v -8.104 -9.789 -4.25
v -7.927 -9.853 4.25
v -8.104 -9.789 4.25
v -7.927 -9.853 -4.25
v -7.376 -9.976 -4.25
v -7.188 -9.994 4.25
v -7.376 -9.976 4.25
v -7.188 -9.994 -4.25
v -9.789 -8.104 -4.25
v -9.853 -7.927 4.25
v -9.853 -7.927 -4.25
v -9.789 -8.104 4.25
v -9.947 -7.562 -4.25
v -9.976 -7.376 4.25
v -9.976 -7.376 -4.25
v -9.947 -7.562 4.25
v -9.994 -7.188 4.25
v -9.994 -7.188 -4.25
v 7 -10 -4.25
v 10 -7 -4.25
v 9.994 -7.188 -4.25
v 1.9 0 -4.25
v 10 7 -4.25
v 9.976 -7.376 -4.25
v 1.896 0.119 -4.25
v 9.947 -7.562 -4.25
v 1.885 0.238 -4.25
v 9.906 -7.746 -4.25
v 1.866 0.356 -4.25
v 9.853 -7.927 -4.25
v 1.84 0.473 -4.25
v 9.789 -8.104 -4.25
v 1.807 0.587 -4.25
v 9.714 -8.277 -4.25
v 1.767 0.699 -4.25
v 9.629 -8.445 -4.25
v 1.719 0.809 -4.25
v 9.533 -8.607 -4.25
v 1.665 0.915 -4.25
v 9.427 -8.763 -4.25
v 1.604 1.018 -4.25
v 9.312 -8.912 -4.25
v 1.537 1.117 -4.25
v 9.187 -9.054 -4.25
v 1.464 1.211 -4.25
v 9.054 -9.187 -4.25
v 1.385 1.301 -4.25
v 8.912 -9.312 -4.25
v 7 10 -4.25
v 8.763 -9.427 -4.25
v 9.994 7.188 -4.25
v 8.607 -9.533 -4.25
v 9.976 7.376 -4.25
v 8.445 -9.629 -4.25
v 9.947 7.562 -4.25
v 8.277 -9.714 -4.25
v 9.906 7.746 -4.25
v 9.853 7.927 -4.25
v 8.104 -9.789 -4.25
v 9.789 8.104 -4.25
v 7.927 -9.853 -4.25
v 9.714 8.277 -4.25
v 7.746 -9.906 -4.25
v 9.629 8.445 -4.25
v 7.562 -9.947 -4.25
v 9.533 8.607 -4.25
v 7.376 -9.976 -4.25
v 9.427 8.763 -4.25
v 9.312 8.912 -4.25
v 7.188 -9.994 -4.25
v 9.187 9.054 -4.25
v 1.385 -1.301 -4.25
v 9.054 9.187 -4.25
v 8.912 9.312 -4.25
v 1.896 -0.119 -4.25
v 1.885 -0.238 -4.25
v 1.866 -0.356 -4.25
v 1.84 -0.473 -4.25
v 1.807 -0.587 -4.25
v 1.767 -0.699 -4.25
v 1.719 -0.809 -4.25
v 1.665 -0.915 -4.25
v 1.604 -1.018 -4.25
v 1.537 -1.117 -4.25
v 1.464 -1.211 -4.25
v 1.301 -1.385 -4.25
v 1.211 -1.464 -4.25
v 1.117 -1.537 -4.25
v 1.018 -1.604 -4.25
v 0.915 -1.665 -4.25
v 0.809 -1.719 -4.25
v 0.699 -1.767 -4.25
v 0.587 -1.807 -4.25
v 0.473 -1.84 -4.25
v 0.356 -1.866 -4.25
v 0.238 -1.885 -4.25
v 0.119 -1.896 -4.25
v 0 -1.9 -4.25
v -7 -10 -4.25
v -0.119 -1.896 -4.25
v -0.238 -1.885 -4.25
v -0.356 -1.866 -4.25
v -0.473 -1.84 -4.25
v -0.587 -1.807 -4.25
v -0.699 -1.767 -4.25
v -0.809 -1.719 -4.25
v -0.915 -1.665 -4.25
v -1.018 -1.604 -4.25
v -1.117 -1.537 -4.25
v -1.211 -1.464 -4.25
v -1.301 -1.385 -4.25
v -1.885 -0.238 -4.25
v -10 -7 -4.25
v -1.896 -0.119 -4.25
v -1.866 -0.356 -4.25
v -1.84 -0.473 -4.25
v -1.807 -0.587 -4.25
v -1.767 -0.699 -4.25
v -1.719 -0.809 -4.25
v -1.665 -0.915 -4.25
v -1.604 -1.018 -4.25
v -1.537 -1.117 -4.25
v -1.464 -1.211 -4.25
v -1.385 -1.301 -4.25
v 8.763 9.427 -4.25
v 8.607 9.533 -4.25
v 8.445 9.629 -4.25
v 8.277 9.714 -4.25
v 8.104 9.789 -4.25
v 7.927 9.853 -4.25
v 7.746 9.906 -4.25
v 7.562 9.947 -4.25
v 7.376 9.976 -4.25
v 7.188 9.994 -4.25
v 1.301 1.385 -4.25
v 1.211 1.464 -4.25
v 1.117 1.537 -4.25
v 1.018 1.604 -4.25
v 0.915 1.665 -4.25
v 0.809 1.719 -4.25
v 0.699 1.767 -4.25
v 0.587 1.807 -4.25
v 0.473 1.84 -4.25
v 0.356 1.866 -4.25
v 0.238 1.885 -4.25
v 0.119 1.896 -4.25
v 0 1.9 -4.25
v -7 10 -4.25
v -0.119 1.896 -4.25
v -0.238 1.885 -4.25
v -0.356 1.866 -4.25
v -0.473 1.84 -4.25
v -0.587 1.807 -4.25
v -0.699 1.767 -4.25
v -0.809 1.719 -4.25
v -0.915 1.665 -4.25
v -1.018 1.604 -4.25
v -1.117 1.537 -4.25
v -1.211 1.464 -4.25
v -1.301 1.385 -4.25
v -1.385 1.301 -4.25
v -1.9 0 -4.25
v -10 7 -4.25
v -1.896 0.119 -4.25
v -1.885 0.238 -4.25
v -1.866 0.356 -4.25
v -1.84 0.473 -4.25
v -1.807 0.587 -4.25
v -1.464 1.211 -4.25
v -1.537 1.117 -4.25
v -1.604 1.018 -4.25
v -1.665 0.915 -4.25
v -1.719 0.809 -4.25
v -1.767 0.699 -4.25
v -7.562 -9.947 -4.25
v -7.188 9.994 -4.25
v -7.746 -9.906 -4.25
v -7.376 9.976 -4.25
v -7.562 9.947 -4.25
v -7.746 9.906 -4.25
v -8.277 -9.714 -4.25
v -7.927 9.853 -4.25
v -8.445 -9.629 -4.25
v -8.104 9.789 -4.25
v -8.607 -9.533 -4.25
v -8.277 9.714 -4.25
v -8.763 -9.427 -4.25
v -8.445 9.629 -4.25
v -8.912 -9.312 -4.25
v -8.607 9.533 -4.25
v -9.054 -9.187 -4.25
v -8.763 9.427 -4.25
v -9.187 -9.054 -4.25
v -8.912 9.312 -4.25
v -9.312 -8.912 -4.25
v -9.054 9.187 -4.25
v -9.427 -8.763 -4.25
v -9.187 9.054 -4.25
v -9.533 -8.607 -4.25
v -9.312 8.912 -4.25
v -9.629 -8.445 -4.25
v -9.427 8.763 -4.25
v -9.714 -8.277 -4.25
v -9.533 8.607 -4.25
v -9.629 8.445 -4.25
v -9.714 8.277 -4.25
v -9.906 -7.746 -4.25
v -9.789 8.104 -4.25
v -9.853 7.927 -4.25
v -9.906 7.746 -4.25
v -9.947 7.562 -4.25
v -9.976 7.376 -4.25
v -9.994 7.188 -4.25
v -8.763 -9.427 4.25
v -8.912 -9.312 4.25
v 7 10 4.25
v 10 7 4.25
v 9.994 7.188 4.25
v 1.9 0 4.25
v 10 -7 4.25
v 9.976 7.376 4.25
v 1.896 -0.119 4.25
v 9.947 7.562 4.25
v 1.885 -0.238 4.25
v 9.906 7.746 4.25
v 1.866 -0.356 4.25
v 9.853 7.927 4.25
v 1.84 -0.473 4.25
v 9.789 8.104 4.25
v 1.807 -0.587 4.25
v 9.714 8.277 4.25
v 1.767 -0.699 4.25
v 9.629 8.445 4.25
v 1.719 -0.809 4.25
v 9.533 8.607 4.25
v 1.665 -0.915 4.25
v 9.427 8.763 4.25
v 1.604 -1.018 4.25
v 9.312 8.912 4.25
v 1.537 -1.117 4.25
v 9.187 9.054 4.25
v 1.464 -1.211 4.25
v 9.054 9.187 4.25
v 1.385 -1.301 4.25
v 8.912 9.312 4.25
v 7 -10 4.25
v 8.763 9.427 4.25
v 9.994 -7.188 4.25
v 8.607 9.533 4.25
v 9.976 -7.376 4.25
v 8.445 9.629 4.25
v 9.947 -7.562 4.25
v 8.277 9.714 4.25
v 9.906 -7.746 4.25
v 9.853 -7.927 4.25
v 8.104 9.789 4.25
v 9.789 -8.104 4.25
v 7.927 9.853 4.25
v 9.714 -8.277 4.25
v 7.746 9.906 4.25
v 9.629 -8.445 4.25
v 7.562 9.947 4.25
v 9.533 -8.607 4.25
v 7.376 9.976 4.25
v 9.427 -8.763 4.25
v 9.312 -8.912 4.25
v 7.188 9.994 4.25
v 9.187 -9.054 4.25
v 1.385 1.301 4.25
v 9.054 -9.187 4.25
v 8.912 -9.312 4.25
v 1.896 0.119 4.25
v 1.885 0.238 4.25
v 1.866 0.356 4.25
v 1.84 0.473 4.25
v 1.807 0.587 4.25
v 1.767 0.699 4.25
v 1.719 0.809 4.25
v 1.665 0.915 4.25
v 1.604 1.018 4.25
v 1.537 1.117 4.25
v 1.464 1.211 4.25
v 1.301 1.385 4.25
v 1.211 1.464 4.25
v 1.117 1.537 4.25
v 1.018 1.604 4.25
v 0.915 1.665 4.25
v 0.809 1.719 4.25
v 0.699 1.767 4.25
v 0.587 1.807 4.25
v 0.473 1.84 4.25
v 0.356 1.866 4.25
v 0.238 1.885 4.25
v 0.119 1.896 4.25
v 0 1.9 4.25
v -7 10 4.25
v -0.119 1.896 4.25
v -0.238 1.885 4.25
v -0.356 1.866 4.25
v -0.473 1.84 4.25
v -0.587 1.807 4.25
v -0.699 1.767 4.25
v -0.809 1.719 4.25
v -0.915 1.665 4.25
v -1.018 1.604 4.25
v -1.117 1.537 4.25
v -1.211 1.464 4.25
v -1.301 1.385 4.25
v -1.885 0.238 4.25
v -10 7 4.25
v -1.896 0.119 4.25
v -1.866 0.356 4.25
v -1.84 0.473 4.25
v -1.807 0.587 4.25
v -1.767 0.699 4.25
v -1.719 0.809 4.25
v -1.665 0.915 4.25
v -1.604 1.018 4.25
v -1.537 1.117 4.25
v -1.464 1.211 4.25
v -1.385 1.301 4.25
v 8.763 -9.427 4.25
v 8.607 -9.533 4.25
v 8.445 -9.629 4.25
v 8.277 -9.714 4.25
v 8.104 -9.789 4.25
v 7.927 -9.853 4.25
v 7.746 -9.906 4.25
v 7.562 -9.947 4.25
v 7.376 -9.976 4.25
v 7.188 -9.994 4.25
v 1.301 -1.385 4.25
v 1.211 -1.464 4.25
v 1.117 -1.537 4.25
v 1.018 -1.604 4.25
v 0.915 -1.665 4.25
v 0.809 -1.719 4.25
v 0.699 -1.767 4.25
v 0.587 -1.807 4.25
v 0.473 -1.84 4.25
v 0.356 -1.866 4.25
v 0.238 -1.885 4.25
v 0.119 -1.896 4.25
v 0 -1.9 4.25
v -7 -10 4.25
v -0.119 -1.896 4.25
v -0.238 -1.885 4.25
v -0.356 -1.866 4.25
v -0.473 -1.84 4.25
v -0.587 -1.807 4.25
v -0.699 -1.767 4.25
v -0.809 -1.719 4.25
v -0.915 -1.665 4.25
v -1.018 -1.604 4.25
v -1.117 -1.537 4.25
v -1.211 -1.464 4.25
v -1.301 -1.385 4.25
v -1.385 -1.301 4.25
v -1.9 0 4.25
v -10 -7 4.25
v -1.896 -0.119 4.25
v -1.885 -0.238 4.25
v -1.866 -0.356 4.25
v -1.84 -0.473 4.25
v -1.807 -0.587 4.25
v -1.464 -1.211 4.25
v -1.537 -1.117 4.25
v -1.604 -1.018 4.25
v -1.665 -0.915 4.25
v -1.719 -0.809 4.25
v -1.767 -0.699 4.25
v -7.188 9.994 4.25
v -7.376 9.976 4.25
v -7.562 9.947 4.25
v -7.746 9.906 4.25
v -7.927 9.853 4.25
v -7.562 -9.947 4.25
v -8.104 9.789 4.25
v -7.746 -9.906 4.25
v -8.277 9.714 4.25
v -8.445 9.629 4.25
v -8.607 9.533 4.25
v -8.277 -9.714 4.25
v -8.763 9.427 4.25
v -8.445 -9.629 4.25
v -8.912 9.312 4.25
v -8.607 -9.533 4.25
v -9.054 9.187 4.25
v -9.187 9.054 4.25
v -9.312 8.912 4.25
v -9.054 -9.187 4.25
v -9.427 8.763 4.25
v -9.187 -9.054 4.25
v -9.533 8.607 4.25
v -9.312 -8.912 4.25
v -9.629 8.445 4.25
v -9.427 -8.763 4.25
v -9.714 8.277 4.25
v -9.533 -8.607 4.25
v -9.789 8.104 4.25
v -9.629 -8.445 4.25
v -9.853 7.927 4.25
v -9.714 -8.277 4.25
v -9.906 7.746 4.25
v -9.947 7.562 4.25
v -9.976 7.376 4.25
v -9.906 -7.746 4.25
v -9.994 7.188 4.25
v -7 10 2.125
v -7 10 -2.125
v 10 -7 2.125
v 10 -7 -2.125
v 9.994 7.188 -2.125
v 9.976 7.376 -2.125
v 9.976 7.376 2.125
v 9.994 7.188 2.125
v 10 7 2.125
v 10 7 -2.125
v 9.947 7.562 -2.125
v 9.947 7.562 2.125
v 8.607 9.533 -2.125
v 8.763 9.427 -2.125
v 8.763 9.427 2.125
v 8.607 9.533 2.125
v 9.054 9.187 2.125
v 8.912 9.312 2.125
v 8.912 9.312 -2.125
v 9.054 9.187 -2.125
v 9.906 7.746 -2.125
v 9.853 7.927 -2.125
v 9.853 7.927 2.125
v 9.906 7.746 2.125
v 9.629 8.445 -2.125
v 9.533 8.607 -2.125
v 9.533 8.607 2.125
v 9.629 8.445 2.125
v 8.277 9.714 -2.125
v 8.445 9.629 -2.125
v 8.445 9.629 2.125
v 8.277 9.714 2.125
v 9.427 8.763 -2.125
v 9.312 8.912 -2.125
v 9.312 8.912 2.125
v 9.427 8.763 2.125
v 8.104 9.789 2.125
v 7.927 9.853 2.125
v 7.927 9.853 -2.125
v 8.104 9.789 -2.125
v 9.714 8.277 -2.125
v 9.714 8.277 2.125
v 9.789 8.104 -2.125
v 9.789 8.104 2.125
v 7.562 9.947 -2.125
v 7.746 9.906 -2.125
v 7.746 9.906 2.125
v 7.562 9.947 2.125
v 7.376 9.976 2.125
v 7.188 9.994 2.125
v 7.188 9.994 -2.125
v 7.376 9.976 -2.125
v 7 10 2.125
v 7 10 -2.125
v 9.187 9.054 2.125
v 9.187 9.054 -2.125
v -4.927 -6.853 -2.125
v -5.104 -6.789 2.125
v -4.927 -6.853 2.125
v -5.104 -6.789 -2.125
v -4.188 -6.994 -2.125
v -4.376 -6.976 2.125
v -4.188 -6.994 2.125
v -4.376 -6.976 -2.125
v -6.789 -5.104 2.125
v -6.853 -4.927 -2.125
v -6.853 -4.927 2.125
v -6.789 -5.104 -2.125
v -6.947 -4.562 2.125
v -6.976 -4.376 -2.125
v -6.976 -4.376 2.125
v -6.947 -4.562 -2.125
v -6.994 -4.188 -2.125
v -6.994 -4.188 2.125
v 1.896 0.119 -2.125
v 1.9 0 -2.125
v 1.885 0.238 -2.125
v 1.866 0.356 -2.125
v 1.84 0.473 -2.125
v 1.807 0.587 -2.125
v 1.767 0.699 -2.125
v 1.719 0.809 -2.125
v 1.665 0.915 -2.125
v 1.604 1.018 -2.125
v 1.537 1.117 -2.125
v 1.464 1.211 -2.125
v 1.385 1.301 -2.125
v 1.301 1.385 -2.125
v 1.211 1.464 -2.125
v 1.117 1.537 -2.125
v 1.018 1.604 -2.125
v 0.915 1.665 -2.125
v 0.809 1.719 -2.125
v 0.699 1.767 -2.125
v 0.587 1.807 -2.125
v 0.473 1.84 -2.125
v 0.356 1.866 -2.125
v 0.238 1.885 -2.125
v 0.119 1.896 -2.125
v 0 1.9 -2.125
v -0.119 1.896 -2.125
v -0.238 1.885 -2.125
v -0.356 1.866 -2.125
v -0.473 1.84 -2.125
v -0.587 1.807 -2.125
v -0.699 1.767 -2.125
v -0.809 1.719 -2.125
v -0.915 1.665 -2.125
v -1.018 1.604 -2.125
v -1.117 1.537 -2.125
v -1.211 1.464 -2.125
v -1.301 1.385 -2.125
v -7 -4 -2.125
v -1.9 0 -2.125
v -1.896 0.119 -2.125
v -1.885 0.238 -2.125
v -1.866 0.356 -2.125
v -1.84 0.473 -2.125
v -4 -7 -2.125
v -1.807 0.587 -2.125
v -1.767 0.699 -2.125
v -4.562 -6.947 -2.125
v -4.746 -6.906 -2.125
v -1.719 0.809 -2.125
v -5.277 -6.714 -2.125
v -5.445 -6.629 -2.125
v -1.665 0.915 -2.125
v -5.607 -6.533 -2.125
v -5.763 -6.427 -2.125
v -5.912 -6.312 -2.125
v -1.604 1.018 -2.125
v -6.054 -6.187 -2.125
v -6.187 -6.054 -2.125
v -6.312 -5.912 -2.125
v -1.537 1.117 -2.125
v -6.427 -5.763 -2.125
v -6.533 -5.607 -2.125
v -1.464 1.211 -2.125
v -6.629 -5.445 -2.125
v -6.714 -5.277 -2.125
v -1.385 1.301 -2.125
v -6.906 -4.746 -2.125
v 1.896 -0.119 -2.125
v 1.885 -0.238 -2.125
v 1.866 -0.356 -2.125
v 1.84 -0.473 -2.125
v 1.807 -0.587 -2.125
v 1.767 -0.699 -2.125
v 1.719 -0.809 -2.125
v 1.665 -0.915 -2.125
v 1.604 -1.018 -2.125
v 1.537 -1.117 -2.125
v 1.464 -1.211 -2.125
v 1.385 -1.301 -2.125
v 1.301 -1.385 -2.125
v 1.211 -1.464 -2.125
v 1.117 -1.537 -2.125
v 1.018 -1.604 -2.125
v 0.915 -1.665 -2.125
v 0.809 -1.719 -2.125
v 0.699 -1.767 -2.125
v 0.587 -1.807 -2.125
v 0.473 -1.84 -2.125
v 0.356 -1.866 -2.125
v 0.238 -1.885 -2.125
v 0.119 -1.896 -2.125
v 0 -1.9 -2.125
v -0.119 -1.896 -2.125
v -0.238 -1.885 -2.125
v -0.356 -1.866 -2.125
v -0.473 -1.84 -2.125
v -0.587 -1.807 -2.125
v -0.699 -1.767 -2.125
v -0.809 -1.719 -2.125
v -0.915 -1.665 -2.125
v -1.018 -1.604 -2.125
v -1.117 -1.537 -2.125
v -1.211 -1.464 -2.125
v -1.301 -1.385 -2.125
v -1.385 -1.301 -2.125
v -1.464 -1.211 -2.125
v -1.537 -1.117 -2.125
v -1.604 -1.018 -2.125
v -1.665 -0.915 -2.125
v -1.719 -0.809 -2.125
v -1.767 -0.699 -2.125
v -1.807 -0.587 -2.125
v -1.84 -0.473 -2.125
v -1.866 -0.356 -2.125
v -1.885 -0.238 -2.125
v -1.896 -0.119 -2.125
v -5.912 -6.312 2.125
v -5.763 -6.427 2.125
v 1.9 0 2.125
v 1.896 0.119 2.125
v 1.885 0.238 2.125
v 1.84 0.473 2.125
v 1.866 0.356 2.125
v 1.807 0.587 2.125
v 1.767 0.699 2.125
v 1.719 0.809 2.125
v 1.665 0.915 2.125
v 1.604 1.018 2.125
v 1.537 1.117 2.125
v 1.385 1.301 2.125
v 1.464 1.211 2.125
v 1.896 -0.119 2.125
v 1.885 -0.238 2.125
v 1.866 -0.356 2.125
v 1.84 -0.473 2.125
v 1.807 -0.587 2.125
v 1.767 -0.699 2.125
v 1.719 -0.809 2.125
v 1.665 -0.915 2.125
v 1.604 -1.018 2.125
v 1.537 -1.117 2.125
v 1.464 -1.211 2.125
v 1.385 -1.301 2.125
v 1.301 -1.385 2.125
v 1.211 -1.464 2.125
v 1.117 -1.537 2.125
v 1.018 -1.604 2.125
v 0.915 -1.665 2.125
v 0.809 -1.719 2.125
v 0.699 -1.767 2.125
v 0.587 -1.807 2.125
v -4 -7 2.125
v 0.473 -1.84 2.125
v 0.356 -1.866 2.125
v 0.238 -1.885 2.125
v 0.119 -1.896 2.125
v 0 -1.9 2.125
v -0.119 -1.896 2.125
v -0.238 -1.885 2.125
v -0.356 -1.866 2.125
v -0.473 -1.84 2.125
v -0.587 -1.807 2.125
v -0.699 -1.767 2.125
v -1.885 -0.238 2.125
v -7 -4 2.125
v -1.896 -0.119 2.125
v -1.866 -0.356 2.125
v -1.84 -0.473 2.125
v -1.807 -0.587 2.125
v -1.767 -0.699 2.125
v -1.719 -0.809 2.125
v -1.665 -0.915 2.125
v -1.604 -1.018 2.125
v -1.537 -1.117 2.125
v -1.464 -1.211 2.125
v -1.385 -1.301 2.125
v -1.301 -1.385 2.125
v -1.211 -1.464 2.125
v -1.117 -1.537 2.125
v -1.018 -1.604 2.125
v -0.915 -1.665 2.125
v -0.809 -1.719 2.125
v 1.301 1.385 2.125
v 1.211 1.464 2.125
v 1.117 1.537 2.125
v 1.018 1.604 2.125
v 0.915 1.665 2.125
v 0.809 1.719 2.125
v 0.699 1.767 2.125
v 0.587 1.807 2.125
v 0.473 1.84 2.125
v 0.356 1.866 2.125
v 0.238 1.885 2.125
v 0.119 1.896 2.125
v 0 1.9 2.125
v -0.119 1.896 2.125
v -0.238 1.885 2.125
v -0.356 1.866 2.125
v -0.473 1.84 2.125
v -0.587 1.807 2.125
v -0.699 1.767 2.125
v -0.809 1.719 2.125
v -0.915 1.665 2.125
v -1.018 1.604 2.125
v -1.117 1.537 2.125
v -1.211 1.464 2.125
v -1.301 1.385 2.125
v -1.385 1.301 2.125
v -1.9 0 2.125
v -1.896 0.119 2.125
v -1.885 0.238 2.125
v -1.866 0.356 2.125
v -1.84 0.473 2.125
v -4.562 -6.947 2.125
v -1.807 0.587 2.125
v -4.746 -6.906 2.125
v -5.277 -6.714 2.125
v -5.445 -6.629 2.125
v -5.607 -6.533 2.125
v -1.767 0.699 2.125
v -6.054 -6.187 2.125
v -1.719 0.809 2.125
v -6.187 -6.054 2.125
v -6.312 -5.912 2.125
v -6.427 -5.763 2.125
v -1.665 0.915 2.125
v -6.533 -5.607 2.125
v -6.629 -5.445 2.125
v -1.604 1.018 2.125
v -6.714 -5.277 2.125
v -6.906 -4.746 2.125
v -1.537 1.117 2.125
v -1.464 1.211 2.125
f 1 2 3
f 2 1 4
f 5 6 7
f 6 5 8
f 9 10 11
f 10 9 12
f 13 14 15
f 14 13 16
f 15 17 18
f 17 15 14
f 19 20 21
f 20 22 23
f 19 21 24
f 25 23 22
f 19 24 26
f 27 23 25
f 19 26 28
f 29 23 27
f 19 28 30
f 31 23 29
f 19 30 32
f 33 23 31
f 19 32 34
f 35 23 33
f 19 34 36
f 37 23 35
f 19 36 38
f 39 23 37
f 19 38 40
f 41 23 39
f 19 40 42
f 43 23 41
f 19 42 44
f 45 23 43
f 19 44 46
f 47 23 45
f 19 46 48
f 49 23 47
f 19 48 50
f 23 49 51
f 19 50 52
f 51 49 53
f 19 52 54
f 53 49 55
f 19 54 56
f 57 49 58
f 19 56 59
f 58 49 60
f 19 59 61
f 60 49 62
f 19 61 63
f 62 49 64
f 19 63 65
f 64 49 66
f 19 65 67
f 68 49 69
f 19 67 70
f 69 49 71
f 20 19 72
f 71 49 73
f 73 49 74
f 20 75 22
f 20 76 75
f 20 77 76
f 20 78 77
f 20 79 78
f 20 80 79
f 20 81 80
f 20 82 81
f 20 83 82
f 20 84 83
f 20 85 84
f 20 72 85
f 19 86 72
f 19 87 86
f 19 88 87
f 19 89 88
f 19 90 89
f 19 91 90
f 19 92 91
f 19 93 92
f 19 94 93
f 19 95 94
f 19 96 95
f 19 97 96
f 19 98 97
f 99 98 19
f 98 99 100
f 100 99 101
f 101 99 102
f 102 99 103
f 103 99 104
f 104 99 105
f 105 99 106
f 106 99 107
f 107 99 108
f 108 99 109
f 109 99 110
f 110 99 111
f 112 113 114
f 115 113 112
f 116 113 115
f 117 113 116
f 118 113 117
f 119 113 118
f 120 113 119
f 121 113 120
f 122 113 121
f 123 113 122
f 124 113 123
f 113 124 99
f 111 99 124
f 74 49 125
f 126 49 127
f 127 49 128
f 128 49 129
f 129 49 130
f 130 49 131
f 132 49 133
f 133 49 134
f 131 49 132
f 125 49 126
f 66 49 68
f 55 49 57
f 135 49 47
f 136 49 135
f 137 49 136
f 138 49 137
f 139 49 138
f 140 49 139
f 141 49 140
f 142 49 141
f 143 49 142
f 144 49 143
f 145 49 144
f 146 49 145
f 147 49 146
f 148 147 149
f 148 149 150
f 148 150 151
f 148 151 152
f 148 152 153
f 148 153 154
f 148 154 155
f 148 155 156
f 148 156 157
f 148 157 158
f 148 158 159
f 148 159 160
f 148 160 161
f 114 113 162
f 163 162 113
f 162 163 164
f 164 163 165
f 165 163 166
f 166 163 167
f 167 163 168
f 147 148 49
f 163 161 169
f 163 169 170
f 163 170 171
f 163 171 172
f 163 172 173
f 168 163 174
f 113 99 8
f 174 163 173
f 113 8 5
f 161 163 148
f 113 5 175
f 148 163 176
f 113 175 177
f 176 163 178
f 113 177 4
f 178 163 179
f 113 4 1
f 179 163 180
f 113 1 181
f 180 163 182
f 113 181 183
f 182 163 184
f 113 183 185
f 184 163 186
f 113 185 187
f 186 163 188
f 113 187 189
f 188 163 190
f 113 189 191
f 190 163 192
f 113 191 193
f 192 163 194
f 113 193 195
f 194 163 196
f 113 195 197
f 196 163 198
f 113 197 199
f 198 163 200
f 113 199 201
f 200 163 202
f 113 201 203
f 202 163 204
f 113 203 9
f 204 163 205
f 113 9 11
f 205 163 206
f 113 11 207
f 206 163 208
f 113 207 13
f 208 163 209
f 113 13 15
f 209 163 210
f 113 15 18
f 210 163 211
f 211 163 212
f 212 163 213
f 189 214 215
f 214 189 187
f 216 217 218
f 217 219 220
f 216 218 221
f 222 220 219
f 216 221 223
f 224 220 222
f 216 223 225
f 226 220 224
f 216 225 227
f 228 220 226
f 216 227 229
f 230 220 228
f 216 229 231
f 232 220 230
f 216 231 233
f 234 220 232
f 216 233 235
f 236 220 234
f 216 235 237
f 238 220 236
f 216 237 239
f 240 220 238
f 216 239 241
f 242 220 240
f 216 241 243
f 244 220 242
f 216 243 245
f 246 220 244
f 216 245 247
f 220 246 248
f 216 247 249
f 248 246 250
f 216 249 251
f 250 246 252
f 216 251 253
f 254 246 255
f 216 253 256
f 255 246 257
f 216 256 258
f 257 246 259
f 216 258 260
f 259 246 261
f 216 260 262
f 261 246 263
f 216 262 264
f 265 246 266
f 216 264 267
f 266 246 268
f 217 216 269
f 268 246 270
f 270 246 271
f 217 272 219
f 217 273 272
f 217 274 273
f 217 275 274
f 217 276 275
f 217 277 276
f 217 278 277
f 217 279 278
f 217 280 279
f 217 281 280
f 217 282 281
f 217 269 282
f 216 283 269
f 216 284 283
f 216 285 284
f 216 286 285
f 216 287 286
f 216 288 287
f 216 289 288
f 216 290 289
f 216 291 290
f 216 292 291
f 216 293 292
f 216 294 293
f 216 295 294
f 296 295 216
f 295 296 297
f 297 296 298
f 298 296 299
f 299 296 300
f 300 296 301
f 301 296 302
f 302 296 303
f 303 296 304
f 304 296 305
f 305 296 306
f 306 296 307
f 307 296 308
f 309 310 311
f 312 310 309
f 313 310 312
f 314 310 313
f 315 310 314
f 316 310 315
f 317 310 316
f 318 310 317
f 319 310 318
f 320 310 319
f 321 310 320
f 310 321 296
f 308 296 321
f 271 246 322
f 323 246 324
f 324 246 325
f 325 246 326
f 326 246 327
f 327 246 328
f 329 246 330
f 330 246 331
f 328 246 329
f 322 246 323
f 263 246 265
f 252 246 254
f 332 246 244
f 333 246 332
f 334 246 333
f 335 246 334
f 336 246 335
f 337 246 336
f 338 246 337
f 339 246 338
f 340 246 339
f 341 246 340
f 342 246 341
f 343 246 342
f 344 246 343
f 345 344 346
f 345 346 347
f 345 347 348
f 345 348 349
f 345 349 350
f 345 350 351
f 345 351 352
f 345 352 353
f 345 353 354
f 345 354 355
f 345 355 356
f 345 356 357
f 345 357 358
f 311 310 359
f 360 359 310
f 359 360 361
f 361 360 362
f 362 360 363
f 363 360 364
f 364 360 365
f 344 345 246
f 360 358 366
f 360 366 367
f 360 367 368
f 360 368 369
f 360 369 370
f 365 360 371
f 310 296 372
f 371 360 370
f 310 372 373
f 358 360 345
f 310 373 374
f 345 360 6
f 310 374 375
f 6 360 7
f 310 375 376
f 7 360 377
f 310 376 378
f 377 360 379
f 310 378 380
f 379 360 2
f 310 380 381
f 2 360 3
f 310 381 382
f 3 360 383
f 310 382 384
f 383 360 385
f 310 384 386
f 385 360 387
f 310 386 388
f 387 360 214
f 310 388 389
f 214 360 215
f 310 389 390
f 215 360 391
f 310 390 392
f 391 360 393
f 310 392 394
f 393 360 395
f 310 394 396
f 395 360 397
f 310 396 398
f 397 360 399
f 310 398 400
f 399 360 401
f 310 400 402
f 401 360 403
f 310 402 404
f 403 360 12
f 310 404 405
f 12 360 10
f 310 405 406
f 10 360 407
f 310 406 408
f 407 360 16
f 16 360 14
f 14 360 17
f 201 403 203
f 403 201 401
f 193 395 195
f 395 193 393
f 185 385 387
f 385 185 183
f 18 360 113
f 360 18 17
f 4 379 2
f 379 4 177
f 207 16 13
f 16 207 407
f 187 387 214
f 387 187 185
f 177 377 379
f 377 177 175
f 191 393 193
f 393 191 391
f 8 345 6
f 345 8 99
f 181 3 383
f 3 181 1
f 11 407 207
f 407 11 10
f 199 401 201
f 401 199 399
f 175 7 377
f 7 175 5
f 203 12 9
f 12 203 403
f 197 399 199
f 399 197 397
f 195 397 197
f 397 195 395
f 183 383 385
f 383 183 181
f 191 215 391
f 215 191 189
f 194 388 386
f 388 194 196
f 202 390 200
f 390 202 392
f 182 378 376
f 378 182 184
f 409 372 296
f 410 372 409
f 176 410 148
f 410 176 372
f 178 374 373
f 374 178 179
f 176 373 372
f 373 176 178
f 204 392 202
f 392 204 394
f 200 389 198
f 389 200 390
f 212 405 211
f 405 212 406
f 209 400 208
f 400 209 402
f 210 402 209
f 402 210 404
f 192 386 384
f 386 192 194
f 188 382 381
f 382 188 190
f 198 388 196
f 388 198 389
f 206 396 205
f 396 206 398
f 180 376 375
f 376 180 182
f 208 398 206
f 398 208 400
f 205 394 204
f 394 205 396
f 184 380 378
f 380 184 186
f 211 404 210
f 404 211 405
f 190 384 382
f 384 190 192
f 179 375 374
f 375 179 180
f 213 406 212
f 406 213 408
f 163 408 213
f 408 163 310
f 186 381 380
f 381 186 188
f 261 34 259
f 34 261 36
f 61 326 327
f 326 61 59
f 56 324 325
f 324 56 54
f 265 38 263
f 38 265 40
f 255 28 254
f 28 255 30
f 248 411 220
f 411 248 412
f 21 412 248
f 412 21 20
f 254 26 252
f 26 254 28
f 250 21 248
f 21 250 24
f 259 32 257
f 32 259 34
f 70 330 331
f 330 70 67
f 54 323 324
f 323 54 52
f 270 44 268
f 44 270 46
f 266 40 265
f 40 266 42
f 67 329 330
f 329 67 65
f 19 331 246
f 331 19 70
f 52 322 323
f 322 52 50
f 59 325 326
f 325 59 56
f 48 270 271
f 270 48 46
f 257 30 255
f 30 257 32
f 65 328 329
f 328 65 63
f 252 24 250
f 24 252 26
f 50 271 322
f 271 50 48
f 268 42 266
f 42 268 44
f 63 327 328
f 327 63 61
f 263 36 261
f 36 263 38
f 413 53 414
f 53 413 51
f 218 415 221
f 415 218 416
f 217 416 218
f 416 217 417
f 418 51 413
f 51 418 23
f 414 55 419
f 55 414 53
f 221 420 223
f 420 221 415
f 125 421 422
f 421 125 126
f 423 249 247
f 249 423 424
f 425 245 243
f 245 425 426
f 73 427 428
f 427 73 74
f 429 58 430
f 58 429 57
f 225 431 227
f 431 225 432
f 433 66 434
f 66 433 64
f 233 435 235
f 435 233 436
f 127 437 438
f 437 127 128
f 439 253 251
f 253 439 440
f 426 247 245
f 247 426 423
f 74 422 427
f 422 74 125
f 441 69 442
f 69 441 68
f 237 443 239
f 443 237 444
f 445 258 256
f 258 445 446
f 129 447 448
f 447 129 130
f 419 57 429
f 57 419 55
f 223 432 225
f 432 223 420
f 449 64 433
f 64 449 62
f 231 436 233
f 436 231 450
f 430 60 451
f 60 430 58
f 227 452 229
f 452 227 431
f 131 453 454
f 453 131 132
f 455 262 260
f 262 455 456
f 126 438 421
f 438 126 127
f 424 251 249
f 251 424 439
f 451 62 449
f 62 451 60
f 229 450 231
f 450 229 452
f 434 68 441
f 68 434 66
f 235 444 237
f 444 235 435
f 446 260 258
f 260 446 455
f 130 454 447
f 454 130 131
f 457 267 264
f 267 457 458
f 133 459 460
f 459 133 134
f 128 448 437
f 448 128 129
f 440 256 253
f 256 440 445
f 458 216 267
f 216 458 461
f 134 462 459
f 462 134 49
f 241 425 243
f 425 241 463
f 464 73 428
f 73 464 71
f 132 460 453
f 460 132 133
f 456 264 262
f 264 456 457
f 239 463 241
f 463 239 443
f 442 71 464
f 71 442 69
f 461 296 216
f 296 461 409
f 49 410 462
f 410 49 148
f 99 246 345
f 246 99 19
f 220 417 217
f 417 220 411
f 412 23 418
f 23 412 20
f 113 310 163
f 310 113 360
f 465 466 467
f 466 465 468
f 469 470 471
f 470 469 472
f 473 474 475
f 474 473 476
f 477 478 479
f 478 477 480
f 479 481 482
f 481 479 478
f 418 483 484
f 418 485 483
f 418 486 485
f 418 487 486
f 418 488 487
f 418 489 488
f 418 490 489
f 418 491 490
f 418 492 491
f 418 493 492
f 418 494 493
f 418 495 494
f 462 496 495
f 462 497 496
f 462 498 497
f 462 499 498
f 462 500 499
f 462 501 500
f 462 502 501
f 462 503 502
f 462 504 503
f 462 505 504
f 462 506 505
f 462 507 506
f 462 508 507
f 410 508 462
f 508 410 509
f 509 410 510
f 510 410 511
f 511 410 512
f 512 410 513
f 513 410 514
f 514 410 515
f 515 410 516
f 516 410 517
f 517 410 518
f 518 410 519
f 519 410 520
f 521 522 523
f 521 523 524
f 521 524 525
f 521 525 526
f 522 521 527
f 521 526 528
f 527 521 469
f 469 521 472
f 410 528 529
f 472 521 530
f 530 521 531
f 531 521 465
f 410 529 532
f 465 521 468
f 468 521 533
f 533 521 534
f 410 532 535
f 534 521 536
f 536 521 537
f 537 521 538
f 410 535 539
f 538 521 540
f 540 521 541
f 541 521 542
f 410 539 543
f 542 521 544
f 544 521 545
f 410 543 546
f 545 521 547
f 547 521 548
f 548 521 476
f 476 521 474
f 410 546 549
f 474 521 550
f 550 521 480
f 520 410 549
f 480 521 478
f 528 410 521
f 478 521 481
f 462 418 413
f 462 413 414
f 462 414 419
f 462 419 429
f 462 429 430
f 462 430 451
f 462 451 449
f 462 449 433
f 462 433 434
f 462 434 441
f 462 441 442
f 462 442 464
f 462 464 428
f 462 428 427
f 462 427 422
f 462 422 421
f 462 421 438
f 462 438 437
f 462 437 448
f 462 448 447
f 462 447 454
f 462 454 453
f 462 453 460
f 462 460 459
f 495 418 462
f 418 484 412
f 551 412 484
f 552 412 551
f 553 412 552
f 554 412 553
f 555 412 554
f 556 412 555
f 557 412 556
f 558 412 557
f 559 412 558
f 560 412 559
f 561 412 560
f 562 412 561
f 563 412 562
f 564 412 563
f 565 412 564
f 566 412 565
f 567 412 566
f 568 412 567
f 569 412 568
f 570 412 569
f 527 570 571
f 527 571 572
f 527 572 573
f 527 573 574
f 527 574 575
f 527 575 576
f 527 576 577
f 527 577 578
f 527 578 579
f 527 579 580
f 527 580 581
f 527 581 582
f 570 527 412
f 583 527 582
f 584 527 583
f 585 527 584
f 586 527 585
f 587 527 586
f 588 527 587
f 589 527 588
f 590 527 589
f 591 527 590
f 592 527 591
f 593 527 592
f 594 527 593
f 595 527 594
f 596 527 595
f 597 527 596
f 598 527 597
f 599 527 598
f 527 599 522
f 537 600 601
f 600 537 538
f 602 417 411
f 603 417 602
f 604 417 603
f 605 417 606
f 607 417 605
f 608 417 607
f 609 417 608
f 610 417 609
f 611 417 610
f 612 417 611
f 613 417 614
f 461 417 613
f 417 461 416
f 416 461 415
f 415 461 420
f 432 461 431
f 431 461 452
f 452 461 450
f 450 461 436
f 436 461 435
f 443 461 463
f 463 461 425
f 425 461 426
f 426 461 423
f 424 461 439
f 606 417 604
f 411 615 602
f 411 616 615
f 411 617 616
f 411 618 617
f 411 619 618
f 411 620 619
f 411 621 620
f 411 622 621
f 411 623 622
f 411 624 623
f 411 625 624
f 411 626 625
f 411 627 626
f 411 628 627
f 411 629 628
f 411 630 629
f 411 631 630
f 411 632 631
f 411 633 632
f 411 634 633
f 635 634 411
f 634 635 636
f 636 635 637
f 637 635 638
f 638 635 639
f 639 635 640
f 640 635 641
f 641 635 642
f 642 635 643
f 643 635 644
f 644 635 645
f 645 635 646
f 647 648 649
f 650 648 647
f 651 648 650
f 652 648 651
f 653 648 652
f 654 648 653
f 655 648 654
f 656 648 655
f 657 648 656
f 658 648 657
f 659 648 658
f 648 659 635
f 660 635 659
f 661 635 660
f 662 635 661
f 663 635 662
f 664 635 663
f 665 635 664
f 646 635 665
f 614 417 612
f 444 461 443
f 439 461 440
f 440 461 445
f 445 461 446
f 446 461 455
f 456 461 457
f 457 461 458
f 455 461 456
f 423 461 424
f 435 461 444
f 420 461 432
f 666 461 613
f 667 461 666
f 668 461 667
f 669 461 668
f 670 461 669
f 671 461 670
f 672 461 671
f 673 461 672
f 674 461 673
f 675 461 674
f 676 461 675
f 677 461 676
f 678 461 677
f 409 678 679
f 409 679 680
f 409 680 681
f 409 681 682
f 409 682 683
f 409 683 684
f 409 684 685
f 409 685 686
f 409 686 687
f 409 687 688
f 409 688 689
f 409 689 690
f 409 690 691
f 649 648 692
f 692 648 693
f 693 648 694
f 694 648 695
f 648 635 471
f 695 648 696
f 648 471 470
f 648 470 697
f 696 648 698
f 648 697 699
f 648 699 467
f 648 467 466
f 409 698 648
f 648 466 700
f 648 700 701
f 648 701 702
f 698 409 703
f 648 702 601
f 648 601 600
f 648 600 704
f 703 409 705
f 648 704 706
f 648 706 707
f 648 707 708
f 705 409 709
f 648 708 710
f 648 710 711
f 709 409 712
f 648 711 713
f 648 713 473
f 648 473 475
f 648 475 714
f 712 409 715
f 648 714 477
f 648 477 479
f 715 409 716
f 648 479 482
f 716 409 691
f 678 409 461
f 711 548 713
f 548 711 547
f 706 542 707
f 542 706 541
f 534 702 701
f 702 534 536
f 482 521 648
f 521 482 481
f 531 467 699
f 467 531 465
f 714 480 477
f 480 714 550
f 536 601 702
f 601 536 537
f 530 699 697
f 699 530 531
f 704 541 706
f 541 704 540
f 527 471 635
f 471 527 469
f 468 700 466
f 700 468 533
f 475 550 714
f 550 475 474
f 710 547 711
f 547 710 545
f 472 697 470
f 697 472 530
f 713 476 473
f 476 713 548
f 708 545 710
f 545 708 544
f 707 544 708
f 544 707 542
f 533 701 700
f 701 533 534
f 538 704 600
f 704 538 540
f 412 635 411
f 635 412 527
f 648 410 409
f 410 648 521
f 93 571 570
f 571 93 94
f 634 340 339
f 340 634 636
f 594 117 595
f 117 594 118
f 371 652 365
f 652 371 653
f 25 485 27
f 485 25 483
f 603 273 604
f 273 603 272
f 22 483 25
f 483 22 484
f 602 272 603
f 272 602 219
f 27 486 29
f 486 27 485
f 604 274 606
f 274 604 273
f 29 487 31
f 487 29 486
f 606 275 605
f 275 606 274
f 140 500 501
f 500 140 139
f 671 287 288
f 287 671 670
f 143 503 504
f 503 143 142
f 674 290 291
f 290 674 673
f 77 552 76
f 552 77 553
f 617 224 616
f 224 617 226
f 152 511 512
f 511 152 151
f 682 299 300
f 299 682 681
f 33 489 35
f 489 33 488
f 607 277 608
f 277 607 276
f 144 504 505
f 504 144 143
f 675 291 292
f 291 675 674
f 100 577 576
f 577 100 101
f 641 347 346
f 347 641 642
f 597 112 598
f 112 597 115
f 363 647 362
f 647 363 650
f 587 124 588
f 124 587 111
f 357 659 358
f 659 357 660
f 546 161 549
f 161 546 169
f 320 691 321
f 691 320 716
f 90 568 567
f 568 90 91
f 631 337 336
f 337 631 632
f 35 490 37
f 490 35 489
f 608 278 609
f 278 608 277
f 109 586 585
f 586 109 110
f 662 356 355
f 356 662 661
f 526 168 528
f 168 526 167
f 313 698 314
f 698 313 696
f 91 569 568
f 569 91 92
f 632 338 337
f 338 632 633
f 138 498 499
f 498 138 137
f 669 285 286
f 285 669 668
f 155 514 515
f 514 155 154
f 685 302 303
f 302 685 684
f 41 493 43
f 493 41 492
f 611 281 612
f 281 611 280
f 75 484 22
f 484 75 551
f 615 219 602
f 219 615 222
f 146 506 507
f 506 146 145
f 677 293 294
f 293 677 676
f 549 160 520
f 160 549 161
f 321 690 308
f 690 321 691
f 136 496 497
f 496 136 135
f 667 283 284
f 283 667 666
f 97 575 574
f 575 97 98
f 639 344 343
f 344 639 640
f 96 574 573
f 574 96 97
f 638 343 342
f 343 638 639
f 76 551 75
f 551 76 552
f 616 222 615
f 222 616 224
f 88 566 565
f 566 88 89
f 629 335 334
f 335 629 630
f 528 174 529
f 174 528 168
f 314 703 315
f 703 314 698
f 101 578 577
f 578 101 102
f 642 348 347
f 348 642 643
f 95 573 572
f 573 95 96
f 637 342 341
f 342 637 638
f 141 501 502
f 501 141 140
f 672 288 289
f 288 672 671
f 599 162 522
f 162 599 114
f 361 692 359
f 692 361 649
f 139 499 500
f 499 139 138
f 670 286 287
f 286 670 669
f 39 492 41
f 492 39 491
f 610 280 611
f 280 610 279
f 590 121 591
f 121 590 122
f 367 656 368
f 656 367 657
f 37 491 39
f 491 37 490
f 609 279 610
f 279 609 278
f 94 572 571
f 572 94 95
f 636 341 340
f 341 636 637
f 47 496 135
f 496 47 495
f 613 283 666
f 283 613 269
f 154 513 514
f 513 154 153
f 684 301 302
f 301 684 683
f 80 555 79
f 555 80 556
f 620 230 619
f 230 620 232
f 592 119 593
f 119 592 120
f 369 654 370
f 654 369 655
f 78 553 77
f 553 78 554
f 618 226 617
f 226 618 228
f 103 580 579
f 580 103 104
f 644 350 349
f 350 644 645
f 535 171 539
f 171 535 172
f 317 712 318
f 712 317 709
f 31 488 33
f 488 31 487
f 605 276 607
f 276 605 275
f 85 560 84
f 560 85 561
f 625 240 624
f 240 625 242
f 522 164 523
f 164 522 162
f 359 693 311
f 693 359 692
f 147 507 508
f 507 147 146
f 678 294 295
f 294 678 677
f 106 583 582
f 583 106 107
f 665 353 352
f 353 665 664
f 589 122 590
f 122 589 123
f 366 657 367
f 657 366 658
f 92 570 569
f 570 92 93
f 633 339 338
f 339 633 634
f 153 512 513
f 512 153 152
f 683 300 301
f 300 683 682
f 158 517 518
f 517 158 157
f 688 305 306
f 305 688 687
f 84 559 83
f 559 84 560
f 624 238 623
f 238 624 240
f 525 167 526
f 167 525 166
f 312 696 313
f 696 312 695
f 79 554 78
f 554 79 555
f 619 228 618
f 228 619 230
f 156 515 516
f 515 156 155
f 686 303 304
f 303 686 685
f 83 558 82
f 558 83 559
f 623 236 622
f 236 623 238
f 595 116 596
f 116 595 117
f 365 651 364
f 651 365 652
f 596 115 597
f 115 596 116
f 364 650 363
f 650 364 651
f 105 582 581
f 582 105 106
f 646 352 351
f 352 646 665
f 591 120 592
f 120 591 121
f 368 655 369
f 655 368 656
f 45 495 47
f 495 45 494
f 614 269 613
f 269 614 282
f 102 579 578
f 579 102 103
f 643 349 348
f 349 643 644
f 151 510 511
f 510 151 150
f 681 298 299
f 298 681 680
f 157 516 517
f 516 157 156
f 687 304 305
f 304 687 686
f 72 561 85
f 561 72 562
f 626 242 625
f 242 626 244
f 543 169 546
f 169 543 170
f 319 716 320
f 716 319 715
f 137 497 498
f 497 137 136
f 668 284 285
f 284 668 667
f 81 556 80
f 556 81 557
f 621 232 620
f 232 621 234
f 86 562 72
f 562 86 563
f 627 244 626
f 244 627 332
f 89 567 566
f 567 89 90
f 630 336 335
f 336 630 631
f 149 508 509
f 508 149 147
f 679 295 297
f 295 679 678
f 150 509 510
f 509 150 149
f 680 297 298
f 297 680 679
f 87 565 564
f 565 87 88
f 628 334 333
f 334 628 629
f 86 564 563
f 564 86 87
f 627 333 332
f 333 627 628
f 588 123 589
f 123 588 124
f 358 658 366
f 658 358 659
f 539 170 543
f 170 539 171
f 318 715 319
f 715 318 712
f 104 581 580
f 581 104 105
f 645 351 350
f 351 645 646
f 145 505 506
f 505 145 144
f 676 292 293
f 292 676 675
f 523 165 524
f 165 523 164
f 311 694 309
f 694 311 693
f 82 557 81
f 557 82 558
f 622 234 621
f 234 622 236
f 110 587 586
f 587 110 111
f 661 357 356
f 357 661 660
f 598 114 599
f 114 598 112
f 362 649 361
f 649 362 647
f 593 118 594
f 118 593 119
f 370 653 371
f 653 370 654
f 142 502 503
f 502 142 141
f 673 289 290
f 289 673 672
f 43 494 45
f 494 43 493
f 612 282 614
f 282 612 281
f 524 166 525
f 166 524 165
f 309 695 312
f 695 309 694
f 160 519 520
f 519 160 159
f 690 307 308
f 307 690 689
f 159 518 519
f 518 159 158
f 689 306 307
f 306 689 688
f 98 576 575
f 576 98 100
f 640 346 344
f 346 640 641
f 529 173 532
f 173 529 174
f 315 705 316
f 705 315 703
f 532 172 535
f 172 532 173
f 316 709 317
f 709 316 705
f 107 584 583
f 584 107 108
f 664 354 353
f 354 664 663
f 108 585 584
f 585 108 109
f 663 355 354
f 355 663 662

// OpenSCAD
// Prusa i3 Bed nut trap

use <MCAD/boxes.scad>;

// parameters
yCarriageThickness = 4.25;
nutWidth = 6;
screwDiam = 3.8;
thickness = yCarriageThickness*2;

module bedNutTrap(){
    difference(){
        roundedBox([20,20,thickness],3,true,$fn=100);
        
        // slot to attach to Y carriage
        translate([3,3,0]) roundedBox([20,20,yCarriageThickness],3,true,$fn=100);
        
        // screw hole
        cylinder(d=screwDiam,h=thickness*1.01,center=true,$fn=100);
    }
}

bedNutTrap();
